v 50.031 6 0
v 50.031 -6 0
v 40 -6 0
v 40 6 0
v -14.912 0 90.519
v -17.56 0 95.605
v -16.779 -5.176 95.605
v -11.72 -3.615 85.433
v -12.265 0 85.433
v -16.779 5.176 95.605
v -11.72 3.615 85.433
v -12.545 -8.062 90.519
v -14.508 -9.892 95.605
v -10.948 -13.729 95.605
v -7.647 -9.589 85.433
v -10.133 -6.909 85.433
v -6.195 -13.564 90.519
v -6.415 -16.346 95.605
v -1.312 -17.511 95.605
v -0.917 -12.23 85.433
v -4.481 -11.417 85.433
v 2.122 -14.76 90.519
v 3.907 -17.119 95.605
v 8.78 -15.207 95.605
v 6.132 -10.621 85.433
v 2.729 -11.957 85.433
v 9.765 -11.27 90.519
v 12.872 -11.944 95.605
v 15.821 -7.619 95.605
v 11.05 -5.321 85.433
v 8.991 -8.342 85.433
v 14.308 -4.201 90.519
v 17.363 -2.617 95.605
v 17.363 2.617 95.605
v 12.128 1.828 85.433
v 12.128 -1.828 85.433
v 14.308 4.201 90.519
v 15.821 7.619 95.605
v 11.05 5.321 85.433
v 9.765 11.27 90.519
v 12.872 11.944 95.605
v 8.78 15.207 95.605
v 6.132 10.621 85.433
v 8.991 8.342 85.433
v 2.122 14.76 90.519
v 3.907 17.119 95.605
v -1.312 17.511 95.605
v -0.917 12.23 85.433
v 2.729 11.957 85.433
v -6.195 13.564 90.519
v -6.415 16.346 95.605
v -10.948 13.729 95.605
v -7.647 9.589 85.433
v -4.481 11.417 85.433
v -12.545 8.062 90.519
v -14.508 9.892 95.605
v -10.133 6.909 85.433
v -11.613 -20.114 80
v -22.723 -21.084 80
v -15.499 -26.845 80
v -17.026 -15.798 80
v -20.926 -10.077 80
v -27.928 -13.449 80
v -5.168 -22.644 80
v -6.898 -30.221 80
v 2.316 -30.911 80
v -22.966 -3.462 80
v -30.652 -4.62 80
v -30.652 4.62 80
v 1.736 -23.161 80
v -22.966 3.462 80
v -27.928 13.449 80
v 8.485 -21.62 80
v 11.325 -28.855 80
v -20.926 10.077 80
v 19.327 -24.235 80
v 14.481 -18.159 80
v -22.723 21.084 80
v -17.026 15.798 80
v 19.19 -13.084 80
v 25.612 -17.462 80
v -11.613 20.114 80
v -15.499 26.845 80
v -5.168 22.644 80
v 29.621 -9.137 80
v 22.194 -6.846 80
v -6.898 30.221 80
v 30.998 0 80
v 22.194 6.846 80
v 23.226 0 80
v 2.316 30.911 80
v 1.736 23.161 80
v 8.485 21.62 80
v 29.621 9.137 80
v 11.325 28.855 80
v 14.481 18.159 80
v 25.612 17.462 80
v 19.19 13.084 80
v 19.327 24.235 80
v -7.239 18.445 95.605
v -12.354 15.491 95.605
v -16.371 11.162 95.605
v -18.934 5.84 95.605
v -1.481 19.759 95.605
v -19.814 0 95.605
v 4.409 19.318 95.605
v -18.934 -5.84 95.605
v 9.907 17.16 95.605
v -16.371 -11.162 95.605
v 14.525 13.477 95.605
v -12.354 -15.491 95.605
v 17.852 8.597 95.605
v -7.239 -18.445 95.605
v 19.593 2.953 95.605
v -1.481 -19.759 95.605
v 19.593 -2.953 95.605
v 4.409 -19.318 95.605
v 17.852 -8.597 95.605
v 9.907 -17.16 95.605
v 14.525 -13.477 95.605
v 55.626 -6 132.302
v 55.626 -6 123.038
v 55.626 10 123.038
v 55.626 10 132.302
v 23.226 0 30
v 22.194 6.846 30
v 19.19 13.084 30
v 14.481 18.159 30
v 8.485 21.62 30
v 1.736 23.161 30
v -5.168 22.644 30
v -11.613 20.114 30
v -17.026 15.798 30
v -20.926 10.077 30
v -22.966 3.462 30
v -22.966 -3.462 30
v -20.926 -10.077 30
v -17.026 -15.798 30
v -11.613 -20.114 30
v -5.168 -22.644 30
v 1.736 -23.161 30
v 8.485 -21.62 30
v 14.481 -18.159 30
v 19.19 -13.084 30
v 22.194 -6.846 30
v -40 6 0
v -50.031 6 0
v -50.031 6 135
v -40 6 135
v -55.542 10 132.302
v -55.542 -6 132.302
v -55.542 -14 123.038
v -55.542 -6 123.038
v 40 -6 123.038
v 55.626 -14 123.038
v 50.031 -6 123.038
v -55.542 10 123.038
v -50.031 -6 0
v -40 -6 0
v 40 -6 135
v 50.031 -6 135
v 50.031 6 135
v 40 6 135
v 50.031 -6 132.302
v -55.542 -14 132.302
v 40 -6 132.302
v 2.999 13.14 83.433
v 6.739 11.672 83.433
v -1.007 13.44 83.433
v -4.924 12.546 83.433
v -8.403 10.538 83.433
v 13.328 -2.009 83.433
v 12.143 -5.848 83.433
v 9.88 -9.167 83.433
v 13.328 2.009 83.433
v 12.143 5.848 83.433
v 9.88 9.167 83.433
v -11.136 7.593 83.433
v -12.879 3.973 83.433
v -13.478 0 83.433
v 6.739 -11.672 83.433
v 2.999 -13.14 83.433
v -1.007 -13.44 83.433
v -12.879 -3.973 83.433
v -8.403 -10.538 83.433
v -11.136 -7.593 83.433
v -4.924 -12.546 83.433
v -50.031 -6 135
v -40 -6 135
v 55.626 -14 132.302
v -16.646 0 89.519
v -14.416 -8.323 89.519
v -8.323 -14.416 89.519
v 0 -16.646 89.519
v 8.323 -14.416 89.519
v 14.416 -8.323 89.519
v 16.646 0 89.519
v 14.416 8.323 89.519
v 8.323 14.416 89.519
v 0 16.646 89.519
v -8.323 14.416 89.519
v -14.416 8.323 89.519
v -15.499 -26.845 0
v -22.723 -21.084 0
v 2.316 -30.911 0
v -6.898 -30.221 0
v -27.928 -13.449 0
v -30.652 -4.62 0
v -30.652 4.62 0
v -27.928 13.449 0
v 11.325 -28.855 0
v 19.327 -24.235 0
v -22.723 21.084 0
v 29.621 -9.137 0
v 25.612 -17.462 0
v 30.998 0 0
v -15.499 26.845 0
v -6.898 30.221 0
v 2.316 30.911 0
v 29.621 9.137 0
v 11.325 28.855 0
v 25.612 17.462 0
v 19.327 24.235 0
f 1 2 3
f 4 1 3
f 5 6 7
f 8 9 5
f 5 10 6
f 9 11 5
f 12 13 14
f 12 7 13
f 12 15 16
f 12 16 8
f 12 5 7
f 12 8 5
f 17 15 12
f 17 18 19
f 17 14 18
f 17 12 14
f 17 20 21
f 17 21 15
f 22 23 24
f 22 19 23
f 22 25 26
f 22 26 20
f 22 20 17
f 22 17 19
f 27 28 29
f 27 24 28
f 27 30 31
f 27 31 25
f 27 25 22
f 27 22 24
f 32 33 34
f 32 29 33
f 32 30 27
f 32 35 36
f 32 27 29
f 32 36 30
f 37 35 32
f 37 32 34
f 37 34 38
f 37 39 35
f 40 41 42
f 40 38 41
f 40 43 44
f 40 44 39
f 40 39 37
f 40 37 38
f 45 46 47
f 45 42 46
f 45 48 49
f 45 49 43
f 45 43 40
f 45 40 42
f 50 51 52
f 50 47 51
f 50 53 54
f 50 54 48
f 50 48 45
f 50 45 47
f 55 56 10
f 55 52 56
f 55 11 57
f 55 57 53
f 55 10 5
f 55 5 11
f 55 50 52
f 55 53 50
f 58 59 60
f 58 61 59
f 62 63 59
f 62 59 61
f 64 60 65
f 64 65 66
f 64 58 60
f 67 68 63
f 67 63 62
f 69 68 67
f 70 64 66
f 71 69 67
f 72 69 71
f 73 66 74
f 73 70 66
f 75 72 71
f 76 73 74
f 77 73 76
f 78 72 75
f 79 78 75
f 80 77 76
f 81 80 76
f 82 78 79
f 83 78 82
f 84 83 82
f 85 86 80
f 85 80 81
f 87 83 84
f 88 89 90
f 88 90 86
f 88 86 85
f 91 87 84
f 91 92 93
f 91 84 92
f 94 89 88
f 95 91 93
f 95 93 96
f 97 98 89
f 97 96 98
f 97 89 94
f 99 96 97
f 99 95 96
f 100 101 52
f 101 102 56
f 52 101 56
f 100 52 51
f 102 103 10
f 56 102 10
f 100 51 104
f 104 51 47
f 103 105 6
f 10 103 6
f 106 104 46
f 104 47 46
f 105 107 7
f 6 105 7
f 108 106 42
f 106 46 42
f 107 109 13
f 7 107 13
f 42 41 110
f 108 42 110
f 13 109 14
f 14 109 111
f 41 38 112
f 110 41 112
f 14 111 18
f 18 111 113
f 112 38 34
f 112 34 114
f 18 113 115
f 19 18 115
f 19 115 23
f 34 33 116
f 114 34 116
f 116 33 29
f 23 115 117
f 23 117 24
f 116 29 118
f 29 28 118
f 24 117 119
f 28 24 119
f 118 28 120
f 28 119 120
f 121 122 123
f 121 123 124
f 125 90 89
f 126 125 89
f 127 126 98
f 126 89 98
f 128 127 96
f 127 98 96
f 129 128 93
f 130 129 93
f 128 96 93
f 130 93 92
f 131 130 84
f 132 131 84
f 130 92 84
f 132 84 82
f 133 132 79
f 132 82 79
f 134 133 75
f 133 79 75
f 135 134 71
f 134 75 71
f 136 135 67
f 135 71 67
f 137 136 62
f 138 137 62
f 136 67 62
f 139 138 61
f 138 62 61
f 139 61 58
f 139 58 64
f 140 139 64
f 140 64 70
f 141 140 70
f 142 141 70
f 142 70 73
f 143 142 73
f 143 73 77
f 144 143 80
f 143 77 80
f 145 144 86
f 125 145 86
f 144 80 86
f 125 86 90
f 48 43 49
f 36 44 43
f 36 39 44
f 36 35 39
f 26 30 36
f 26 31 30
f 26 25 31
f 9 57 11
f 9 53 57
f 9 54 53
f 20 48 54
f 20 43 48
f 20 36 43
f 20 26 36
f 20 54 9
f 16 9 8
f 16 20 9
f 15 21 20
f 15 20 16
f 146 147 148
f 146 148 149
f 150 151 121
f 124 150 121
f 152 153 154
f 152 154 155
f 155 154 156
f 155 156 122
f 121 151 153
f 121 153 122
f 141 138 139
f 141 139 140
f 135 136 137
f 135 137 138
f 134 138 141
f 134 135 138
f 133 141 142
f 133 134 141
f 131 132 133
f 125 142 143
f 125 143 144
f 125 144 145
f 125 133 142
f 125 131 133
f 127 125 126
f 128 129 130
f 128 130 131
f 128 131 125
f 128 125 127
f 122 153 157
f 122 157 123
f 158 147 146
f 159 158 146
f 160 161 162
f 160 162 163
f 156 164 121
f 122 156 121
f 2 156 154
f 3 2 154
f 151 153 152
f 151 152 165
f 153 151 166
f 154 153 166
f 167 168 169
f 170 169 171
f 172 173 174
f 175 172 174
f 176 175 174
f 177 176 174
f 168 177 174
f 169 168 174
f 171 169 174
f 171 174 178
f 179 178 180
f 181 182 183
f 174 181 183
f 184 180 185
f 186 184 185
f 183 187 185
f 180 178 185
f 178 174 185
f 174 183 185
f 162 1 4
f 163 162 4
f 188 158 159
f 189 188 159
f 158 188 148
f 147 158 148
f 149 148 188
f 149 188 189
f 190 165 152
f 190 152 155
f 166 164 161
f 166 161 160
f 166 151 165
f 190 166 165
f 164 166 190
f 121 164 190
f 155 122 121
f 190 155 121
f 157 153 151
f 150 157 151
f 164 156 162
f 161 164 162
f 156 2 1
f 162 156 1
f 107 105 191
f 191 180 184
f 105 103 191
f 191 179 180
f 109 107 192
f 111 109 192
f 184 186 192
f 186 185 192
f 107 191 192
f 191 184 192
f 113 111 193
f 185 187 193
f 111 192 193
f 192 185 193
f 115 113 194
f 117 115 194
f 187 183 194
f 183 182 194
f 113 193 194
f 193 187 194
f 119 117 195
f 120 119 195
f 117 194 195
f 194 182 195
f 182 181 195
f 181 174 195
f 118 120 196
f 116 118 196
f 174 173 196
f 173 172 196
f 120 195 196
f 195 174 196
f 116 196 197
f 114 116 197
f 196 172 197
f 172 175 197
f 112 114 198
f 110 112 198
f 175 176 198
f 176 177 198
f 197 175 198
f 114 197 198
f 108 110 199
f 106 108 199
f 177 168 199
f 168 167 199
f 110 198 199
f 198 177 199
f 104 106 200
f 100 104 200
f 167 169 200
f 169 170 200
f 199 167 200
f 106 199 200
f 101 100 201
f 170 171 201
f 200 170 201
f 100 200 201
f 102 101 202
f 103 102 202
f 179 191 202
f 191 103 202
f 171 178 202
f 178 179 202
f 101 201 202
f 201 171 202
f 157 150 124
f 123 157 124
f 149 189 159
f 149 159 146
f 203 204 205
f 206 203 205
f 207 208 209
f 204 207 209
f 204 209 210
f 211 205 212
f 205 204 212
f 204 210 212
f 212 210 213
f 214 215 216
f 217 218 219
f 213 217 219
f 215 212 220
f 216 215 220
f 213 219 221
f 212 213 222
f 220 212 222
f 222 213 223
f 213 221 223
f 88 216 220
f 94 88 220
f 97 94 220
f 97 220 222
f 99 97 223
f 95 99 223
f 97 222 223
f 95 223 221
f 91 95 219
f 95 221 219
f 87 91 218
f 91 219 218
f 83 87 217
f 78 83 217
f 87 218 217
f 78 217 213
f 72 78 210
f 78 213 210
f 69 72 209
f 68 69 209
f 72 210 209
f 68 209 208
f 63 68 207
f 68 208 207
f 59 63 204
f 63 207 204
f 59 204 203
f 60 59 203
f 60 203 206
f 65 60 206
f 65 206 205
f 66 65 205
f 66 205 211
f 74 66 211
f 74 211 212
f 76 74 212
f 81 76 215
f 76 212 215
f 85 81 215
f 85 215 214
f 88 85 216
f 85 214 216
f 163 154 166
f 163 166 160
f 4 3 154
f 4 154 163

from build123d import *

# Parameters (mm, degrees)
F0_R     = 30.9978474474
F1_DEPTH = 80
F3_W     = 10.031348531
F3_H     = 12
F4_DEPTH = 135
F2_R     = 23.225828689
F6_DEPTH = 50
F7_W     = 111.1673414707
F7_H     = 9.2639476061
F8_DEPTH = 8
F9_DEPTH = 16
F13_T    = -2


with BuildPart() as f1:
    # F0 (on Top) → F1 (new body)
    with BuildSketch(Plane.XY):
        Circle(F0_R)
    extrude(amount=F1_DEPTH)

    # F2 (on face) → F6 (cut)
    with BuildSketch(Plane.XY.offset(80)):
        Circle(F2_R)
    extrude(amount=-F6_DEPTH, mode=Mode.SUBTRACT)


with BuildPart() as f4:
    # F3 (on Top) → F4 (new body)
    with BuildSketch(Plane.XY):
        with Locations((-45.0156742655, 0)):
            Rectangle(F3_W, F3_H)
    extrude(amount=F4_DEPTH)


with BuildPart() as f5_1:
    # F5: instance of F4
    add(f4.part.mirror(Plane.YZ))

    # F7 (on face) → F8 (join)
    with BuildSketch(Plane.XZ.offset(6)):
        with Locations((0.0420436263, 127.6696696877)):
            Rectangle(F7_W, F7_H)
    extrude(amount=F8_DEPTH)


with BuildPart() as f9:
    # F7 (on face) → F9 (new body)
    with BuildSketch(Plane.XZ.offset(6)):
        with Locations((0.0420436263, 127.6696696877)):
            Rectangle(F7_W, F7_H)
    extrude(amount=-F9_DEPTH)


with BuildPart() as f12:
    # F10 (on Front) → F12 (revolve)
    with BuildSketch(Plane.XZ):
        Polygon((-13.4781552479, 83.4328308702), (0, 83.4328308702), (0, 95.6050306559), (-19.8143702, 95.6050306559), align=None)
    revolve(axis=Axis((0, 0, 98.2741937041), (0, 0, 1)))

    # F13
    f13_openings = [f12.faces().sort_by_distance(p)[0] for p in [
        (0, 0, 95.605031),
    ]]
    offset(amount=F13_T, openings=f13_openings)


solid = Compound([f1.part, f4.part, f5_1.part, f9.part, f12.part])
